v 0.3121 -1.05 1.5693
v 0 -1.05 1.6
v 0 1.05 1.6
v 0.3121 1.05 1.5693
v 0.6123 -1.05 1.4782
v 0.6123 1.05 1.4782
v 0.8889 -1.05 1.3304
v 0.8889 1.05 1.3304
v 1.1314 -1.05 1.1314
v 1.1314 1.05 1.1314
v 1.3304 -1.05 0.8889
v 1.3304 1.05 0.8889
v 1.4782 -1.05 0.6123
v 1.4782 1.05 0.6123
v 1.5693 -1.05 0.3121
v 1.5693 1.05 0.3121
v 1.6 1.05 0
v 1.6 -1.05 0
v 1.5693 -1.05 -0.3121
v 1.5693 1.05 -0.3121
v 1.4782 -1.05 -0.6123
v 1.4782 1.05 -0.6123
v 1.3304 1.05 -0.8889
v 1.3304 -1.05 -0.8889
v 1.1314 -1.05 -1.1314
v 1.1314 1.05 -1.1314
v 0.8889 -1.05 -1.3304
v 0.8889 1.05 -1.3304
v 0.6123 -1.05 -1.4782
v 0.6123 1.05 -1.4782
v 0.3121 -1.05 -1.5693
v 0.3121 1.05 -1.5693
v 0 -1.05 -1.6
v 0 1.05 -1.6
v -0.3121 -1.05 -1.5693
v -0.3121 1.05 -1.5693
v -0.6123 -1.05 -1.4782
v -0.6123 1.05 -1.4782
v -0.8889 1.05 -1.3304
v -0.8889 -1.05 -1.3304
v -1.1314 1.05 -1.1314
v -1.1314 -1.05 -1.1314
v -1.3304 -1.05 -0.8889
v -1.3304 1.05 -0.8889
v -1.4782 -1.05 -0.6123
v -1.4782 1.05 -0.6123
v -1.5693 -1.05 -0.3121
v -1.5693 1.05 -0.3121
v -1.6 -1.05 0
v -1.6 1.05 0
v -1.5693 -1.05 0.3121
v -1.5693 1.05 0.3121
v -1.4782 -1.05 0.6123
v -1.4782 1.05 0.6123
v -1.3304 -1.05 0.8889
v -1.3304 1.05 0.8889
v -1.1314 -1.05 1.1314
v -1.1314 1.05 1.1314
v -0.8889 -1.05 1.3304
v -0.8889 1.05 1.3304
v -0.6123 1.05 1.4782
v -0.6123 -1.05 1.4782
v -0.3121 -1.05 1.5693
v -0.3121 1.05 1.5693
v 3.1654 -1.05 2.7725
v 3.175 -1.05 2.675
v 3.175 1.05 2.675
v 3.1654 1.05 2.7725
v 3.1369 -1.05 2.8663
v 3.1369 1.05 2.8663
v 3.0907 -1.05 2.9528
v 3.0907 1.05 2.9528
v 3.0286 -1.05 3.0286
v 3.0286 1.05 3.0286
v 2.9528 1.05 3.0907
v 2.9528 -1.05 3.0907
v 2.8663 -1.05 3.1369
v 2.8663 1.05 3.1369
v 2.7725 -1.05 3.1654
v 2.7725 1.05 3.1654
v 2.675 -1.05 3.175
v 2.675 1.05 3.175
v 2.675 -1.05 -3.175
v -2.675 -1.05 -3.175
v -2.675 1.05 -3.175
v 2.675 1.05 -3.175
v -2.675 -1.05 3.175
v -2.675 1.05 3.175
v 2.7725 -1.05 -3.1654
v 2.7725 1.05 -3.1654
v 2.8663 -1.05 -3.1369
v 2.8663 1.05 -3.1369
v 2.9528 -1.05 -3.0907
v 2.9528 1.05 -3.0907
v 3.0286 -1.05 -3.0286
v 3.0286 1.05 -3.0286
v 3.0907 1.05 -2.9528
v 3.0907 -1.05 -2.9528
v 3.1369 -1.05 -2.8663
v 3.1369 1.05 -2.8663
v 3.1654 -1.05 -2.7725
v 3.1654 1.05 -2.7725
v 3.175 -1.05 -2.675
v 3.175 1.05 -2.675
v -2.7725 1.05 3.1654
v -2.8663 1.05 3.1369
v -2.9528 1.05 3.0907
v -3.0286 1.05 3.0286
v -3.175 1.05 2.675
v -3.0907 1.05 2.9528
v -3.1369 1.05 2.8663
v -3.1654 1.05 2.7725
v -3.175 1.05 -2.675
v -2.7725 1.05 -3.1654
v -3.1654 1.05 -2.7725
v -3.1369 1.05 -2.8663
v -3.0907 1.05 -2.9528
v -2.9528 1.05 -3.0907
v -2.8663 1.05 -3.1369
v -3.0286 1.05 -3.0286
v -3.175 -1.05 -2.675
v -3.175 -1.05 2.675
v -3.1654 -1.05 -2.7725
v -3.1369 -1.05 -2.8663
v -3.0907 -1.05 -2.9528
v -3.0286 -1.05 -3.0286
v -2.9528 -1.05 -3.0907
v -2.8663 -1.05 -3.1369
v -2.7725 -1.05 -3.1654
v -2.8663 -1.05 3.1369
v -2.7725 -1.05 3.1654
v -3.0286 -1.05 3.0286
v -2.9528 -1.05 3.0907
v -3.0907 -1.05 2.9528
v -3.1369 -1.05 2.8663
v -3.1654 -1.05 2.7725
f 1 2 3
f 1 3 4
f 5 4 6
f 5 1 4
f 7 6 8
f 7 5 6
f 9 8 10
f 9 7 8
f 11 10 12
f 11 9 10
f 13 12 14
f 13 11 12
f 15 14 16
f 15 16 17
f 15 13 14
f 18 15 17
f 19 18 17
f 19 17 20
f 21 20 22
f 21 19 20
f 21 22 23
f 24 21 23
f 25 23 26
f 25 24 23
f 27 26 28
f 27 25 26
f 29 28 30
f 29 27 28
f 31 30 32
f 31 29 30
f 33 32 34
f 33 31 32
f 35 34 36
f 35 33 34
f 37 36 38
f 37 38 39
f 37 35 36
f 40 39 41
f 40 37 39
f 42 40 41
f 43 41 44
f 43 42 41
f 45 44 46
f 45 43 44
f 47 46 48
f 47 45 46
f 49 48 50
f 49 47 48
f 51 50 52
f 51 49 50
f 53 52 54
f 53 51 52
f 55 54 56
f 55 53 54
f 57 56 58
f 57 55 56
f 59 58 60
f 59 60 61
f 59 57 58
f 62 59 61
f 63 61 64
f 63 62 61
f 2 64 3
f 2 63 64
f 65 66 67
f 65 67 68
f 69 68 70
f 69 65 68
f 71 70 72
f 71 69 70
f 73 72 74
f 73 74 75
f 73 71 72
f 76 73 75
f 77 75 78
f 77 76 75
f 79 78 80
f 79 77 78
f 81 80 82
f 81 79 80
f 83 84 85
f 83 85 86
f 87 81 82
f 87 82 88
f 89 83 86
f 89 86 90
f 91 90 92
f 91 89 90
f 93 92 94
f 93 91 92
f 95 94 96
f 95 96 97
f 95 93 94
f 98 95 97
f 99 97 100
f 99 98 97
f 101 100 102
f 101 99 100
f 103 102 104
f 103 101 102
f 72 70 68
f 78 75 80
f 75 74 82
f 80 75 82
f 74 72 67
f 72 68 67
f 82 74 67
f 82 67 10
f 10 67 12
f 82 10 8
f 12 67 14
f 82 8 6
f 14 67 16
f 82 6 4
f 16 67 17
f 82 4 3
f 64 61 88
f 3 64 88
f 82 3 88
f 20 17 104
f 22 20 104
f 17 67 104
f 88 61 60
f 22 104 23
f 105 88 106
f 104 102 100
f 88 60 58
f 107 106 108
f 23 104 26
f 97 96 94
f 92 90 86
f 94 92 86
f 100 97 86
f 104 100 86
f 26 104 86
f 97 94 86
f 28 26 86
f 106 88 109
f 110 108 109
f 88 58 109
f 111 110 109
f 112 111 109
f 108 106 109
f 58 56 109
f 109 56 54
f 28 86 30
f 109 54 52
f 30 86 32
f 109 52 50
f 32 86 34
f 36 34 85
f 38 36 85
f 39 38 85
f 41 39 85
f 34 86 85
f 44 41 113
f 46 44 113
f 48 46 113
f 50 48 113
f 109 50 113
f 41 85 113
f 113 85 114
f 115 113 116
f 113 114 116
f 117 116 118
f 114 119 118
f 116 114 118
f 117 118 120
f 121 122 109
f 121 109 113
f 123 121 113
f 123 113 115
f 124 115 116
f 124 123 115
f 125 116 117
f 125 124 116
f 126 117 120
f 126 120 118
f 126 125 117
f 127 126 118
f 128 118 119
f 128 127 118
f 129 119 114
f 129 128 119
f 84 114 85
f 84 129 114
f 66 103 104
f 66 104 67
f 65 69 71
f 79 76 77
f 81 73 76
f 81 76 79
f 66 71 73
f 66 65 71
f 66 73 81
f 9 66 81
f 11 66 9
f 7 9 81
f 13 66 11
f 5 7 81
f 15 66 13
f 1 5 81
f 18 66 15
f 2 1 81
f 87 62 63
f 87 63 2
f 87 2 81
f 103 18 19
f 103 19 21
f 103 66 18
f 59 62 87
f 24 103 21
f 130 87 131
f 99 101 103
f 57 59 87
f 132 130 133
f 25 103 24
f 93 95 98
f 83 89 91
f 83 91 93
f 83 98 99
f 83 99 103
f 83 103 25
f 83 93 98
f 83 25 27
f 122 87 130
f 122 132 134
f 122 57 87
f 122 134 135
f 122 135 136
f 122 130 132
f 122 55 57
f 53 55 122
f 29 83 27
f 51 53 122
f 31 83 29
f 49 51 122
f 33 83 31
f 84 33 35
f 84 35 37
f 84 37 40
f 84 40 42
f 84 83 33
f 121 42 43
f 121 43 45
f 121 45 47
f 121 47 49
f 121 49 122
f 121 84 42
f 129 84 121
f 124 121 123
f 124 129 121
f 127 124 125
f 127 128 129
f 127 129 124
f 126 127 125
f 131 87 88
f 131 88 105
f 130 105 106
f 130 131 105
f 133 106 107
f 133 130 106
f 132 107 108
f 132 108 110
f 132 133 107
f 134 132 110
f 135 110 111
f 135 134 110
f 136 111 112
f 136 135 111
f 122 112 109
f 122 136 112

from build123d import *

# Parameters (mm, degrees)
BOSS_EXTRUDE1_DEPTH      = 1.05
BOSS_EXTRUDE1_DEPTH_BACK = 1.05
SKETCH1_R                = 1.6


with BuildPart() as part:
    # Sketch1 → Boss-Extrude1 (new, two sides: drawn at the far end of the back side and taken through both)
    with BuildSketch(Plane(origin=(0, 0, 0), x_dir=(1, 0, 0), z_dir=(0, 1, 0)).offset(-BOSS_EXTRUDE1_DEPTH_BACK)):
        with BuildLine():
            Line((-2.675, 3.175), (2.675, 3.175))
            ThreePointArc((2.675, 3.175), (3.028553391, 3.028553391), (3.175, 2.675))
            Line((3.175, 2.675), (3.175, -2.675))
            ThreePointArc((3.175, -2.675), (3.028553391, -3.028553391), (2.675, -3.175))
            Line((2.675, -3.175), (-2.675, -3.175))
            ThreePointArc((-2.675, -3.175), (-3.028553391, -3.028553391), (-3.175, -2.675))
            Line((-3.175, -2.675), (-3.175, 2.675))
            ThreePointArc((-3.175, 2.675), (-3.028553391, 3.028553391), (-2.675, 3.175))
        make_face()
        Circle(SKETCH1_R, mode=Mode.SUBTRACT)
    extrude(amount=BOSS_EXTRUDE1_DEPTH + BOSS_EXTRUDE1_DEPTH_BACK)


solid = part.part
